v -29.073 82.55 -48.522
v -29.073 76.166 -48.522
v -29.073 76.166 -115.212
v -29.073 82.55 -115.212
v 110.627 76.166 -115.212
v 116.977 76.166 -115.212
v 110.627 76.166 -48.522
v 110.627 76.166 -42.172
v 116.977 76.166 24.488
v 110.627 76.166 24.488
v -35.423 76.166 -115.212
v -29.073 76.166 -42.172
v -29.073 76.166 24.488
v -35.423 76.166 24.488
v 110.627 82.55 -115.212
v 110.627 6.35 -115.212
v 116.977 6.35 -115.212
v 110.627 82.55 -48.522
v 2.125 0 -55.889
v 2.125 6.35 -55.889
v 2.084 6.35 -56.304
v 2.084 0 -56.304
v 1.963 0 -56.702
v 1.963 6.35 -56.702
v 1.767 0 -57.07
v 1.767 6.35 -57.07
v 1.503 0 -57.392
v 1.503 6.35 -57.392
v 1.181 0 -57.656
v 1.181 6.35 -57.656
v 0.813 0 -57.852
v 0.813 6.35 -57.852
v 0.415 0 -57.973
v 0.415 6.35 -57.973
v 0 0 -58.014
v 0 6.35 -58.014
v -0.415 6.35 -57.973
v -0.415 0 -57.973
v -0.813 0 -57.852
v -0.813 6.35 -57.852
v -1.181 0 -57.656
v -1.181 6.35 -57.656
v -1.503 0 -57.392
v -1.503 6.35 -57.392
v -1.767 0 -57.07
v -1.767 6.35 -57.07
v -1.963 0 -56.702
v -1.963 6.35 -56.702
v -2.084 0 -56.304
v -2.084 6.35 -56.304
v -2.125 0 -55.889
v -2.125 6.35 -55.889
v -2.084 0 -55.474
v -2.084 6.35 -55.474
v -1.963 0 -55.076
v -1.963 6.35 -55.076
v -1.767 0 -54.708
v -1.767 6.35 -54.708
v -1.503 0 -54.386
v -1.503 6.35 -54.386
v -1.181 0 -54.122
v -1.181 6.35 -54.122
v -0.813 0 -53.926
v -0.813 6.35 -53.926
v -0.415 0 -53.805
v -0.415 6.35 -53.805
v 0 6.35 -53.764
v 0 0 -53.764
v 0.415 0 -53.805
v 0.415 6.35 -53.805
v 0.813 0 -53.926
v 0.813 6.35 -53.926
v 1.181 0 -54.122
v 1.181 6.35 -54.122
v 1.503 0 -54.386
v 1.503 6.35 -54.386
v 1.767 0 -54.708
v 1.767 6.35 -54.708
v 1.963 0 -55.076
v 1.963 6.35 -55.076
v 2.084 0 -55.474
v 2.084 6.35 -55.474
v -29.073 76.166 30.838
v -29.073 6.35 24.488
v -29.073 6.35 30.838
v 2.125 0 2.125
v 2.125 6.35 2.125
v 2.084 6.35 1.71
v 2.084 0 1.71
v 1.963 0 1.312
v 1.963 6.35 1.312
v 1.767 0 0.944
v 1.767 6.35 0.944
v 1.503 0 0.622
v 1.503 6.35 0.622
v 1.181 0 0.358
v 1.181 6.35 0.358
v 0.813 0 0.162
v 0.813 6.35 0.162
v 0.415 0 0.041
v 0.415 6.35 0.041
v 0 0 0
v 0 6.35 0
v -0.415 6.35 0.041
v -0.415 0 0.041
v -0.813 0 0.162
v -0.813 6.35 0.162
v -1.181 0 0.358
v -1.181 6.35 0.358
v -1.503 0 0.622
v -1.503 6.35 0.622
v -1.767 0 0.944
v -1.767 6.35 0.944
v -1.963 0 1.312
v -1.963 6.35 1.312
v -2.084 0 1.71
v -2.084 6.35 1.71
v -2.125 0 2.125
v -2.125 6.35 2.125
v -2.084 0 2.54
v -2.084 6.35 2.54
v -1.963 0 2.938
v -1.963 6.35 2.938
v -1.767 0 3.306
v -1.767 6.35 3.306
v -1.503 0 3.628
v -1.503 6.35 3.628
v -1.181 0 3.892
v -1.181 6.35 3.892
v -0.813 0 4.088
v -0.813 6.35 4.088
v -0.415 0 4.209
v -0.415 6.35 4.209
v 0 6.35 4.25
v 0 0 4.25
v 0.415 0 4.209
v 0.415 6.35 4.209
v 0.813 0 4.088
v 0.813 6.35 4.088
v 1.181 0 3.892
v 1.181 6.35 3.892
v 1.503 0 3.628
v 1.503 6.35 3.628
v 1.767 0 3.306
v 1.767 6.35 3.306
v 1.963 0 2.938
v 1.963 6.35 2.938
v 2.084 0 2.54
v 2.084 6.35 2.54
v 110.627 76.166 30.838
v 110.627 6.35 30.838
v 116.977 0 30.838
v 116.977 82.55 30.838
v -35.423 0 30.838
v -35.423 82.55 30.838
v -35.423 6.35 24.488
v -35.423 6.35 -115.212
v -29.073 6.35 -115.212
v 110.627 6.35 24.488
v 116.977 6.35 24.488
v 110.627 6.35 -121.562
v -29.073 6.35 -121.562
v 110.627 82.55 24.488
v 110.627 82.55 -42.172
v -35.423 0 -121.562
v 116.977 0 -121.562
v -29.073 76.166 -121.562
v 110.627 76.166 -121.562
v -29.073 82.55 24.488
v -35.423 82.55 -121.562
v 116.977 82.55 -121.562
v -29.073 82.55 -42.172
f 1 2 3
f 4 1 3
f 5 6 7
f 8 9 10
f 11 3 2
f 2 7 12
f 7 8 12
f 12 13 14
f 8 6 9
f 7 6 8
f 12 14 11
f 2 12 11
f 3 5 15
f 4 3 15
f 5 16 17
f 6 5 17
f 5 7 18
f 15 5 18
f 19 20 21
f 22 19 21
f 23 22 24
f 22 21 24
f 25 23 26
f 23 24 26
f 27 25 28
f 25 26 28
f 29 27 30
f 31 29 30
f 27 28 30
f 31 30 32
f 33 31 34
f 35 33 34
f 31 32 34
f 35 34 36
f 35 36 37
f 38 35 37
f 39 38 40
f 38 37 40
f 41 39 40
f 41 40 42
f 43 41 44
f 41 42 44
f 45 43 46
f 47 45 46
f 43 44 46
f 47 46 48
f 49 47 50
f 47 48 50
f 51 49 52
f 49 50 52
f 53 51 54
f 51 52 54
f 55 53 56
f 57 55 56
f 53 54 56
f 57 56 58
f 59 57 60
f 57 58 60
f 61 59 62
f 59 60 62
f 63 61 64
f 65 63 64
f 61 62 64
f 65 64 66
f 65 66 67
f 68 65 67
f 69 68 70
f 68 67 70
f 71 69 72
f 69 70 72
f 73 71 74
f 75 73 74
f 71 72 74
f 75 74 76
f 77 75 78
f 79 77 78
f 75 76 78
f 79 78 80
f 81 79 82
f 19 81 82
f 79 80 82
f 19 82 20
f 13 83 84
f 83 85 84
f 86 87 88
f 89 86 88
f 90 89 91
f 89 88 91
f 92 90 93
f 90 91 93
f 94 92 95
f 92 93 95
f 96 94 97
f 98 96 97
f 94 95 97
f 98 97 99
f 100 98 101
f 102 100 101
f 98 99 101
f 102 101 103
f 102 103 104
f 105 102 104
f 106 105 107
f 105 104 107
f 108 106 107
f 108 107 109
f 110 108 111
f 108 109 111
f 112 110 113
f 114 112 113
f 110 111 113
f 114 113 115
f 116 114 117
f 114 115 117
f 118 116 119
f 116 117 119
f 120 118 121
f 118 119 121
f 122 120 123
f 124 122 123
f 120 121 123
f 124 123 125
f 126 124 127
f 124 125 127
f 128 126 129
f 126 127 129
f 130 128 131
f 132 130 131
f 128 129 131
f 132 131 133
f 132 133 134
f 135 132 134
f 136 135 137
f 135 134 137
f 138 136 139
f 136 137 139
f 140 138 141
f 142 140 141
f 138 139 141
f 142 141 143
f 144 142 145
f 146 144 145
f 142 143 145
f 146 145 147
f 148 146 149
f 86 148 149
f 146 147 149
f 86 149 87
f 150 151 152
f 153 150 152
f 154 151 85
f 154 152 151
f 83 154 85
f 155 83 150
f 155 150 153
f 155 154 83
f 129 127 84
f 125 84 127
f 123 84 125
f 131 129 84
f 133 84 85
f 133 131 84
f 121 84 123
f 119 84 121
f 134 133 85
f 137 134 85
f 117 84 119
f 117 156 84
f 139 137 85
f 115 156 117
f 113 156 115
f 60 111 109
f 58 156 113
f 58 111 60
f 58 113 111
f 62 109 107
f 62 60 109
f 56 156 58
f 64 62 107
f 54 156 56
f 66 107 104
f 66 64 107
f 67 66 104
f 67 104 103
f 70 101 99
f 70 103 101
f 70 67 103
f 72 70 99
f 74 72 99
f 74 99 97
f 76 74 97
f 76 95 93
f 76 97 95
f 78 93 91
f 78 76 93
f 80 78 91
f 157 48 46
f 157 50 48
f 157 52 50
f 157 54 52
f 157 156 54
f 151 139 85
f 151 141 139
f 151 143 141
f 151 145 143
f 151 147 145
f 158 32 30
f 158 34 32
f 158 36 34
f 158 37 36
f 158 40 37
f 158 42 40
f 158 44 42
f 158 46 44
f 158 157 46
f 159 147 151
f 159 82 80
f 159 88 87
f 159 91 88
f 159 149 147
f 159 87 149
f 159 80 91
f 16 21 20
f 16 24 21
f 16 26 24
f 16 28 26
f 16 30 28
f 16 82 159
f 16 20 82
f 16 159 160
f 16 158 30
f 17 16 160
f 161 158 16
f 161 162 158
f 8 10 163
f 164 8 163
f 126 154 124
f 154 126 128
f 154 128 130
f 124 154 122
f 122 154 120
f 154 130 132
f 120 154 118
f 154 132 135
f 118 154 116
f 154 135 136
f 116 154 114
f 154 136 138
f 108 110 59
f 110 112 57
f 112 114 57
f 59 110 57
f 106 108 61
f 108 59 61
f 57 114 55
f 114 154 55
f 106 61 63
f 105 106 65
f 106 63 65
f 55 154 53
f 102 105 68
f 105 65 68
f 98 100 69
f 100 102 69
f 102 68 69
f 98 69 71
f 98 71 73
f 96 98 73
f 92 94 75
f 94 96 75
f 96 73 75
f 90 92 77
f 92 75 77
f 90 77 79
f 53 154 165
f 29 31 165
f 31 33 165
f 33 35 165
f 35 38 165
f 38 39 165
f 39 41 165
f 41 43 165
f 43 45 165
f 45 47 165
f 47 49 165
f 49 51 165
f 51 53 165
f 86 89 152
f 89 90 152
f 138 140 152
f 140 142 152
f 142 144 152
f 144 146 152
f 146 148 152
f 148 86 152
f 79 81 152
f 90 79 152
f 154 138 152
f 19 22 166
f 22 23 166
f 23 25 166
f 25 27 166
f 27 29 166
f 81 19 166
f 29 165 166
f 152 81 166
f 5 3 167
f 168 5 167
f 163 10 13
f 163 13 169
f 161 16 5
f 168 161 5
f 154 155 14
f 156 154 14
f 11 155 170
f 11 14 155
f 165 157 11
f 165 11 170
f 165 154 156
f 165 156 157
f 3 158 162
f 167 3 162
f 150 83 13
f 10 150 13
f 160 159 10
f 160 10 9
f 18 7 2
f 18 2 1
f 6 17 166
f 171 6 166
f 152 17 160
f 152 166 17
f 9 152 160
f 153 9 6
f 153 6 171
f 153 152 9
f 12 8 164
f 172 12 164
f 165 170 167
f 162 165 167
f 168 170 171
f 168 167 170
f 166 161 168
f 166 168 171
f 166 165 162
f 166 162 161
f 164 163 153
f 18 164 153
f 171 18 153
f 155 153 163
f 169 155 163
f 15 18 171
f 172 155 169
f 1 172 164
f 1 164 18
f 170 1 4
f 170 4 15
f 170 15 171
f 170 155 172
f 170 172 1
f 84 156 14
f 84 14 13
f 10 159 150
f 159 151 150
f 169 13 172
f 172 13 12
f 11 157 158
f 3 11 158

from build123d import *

# Parameters (mm, degrees)
SKETCH1_W           = 152.4
SKETCH1_H           = 152.4
BOSS_EXTRUDE1_DEPTH = 6.35
SKETCH2_R           = 2.125
CUT_EXTRUDE1_DEPTH  = 6.35
SKETCH3_W           = 6.35
SKETCH3_H           = 6.35
BOSS_EXTRUDE2_DEPTH = 76.2
SKETCH4_W           = 6.35
SKETCH4_H           = 6.384095646
BOSS_EXTRUDE3_DEPTH = 139.7
SKETCH5_W           = 6.35
SKETCH5_H           = 6.384095646
BOSS_EXTRUDE4_DEPTH = 139.7
SKETCH6_W           = 6.35
SKETCH6_H           = 6.384095646
BOSS_EXTRUDE5_DEPTH = 139.7


with BuildPart() as part:
    # Sketch1 → Boss-Extrude1 (new body)
    with BuildSketch(Plane(origin=(0, 0, 0), x_dir=(1, 0, 0), z_dir=(0, 1, 0))):
        with Locations((40.776583963, 45.362139437)):
            Rectangle(SKETCH1_W, SKETCH1_H)
    extrude(amount=BOSS_EXTRUDE1_DEPTH)

    # Sketch2 → Cut-Extrude1 (cut)
    with BuildSketch(Plane(origin=(0, 6.35, 0), x_dir=(1, 0, 0), z_dir=(0, 1, 0))):
        with Locations((0, -2.125)):
            Circle(SKETCH2_R)
        with Locations((0, 55.889)):
            Circle(SKETCH2_R)
    extrude(amount=-CUT_EXTRUDE1_DEPTH, mode=Mode.SUBTRACT)

    # Sketch3 → Boss-Extrude2 (add)
    with BuildSketch(Plane(origin=(0, 6.35, 0), x_dir=(1, 0, 0), z_dir=(0, 1, 0))):
        with Locations((113.801583963, -27.662860563)):
            Rectangle(SKETCH3_W, SKETCH3_H)
        with Locations((-32.248416037, -27.662860563)):
            Rectangle(SKETCH3_W, SKETCH3_H)
        with Locations((-32.248416037, 118.387139437)):
            Rectangle(SKETCH3_W, SKETCH3_H)
        with Locations((113.801583963, 118.387139437)):
            Rectangle(SKETCH3_W, SKETCH3_H)
    extrude(amount=BOSS_EXTRUDE2_DEPTH)

    # Sketch4 → Boss-Extrude3 (add)
    with BuildSketch(Plane(origin=(0, 0, 24.487860563), x_dir=(-1, 0, 0), z_dir=(0, 0, -1))):
        with Locations((-113.801583963, 79.357952177)):
            Rectangle(SKETCH4_W, SKETCH4_H)
        with Locations((32.248416037, 79.357952177)):
            Rectangle(SKETCH4_W, SKETCH4_H)
    extrude(amount=BOSS_EXTRUDE3_DEPTH)

    # Sketch5 → Boss-Extrude4 (add)
    with BuildSketch(Plane(origin=(-29.073416037, 0, 0), x_dir=(0, 0, -1), z_dir=(1, 0, 0))):
        with Locations((-27.662860563, 79.357952177)):
            Rectangle(SKETCH5_W, SKETCH5_H)
        with Locations((118.387139437, 79.357952177)):
            Rectangle(SKETCH5_W, SKETCH5_H)
    extrude(amount=BOSS_EXTRUDE4_DEPTH)

    # Sketch6 → Boss-Extrude5 (add)
    with BuildSketch(Plane(origin=(-29.073416037, 0, 0), x_dir=(0, 0, -1), z_dir=(1, 0, 0))):
        with Locations((45.347085843, 79.357952177)):
            Rectangle(SKETCH6_W, SKETCH6_H)
    extrude(amount=BOSS_EXTRUDE5_DEPTH)


solid = part.part
